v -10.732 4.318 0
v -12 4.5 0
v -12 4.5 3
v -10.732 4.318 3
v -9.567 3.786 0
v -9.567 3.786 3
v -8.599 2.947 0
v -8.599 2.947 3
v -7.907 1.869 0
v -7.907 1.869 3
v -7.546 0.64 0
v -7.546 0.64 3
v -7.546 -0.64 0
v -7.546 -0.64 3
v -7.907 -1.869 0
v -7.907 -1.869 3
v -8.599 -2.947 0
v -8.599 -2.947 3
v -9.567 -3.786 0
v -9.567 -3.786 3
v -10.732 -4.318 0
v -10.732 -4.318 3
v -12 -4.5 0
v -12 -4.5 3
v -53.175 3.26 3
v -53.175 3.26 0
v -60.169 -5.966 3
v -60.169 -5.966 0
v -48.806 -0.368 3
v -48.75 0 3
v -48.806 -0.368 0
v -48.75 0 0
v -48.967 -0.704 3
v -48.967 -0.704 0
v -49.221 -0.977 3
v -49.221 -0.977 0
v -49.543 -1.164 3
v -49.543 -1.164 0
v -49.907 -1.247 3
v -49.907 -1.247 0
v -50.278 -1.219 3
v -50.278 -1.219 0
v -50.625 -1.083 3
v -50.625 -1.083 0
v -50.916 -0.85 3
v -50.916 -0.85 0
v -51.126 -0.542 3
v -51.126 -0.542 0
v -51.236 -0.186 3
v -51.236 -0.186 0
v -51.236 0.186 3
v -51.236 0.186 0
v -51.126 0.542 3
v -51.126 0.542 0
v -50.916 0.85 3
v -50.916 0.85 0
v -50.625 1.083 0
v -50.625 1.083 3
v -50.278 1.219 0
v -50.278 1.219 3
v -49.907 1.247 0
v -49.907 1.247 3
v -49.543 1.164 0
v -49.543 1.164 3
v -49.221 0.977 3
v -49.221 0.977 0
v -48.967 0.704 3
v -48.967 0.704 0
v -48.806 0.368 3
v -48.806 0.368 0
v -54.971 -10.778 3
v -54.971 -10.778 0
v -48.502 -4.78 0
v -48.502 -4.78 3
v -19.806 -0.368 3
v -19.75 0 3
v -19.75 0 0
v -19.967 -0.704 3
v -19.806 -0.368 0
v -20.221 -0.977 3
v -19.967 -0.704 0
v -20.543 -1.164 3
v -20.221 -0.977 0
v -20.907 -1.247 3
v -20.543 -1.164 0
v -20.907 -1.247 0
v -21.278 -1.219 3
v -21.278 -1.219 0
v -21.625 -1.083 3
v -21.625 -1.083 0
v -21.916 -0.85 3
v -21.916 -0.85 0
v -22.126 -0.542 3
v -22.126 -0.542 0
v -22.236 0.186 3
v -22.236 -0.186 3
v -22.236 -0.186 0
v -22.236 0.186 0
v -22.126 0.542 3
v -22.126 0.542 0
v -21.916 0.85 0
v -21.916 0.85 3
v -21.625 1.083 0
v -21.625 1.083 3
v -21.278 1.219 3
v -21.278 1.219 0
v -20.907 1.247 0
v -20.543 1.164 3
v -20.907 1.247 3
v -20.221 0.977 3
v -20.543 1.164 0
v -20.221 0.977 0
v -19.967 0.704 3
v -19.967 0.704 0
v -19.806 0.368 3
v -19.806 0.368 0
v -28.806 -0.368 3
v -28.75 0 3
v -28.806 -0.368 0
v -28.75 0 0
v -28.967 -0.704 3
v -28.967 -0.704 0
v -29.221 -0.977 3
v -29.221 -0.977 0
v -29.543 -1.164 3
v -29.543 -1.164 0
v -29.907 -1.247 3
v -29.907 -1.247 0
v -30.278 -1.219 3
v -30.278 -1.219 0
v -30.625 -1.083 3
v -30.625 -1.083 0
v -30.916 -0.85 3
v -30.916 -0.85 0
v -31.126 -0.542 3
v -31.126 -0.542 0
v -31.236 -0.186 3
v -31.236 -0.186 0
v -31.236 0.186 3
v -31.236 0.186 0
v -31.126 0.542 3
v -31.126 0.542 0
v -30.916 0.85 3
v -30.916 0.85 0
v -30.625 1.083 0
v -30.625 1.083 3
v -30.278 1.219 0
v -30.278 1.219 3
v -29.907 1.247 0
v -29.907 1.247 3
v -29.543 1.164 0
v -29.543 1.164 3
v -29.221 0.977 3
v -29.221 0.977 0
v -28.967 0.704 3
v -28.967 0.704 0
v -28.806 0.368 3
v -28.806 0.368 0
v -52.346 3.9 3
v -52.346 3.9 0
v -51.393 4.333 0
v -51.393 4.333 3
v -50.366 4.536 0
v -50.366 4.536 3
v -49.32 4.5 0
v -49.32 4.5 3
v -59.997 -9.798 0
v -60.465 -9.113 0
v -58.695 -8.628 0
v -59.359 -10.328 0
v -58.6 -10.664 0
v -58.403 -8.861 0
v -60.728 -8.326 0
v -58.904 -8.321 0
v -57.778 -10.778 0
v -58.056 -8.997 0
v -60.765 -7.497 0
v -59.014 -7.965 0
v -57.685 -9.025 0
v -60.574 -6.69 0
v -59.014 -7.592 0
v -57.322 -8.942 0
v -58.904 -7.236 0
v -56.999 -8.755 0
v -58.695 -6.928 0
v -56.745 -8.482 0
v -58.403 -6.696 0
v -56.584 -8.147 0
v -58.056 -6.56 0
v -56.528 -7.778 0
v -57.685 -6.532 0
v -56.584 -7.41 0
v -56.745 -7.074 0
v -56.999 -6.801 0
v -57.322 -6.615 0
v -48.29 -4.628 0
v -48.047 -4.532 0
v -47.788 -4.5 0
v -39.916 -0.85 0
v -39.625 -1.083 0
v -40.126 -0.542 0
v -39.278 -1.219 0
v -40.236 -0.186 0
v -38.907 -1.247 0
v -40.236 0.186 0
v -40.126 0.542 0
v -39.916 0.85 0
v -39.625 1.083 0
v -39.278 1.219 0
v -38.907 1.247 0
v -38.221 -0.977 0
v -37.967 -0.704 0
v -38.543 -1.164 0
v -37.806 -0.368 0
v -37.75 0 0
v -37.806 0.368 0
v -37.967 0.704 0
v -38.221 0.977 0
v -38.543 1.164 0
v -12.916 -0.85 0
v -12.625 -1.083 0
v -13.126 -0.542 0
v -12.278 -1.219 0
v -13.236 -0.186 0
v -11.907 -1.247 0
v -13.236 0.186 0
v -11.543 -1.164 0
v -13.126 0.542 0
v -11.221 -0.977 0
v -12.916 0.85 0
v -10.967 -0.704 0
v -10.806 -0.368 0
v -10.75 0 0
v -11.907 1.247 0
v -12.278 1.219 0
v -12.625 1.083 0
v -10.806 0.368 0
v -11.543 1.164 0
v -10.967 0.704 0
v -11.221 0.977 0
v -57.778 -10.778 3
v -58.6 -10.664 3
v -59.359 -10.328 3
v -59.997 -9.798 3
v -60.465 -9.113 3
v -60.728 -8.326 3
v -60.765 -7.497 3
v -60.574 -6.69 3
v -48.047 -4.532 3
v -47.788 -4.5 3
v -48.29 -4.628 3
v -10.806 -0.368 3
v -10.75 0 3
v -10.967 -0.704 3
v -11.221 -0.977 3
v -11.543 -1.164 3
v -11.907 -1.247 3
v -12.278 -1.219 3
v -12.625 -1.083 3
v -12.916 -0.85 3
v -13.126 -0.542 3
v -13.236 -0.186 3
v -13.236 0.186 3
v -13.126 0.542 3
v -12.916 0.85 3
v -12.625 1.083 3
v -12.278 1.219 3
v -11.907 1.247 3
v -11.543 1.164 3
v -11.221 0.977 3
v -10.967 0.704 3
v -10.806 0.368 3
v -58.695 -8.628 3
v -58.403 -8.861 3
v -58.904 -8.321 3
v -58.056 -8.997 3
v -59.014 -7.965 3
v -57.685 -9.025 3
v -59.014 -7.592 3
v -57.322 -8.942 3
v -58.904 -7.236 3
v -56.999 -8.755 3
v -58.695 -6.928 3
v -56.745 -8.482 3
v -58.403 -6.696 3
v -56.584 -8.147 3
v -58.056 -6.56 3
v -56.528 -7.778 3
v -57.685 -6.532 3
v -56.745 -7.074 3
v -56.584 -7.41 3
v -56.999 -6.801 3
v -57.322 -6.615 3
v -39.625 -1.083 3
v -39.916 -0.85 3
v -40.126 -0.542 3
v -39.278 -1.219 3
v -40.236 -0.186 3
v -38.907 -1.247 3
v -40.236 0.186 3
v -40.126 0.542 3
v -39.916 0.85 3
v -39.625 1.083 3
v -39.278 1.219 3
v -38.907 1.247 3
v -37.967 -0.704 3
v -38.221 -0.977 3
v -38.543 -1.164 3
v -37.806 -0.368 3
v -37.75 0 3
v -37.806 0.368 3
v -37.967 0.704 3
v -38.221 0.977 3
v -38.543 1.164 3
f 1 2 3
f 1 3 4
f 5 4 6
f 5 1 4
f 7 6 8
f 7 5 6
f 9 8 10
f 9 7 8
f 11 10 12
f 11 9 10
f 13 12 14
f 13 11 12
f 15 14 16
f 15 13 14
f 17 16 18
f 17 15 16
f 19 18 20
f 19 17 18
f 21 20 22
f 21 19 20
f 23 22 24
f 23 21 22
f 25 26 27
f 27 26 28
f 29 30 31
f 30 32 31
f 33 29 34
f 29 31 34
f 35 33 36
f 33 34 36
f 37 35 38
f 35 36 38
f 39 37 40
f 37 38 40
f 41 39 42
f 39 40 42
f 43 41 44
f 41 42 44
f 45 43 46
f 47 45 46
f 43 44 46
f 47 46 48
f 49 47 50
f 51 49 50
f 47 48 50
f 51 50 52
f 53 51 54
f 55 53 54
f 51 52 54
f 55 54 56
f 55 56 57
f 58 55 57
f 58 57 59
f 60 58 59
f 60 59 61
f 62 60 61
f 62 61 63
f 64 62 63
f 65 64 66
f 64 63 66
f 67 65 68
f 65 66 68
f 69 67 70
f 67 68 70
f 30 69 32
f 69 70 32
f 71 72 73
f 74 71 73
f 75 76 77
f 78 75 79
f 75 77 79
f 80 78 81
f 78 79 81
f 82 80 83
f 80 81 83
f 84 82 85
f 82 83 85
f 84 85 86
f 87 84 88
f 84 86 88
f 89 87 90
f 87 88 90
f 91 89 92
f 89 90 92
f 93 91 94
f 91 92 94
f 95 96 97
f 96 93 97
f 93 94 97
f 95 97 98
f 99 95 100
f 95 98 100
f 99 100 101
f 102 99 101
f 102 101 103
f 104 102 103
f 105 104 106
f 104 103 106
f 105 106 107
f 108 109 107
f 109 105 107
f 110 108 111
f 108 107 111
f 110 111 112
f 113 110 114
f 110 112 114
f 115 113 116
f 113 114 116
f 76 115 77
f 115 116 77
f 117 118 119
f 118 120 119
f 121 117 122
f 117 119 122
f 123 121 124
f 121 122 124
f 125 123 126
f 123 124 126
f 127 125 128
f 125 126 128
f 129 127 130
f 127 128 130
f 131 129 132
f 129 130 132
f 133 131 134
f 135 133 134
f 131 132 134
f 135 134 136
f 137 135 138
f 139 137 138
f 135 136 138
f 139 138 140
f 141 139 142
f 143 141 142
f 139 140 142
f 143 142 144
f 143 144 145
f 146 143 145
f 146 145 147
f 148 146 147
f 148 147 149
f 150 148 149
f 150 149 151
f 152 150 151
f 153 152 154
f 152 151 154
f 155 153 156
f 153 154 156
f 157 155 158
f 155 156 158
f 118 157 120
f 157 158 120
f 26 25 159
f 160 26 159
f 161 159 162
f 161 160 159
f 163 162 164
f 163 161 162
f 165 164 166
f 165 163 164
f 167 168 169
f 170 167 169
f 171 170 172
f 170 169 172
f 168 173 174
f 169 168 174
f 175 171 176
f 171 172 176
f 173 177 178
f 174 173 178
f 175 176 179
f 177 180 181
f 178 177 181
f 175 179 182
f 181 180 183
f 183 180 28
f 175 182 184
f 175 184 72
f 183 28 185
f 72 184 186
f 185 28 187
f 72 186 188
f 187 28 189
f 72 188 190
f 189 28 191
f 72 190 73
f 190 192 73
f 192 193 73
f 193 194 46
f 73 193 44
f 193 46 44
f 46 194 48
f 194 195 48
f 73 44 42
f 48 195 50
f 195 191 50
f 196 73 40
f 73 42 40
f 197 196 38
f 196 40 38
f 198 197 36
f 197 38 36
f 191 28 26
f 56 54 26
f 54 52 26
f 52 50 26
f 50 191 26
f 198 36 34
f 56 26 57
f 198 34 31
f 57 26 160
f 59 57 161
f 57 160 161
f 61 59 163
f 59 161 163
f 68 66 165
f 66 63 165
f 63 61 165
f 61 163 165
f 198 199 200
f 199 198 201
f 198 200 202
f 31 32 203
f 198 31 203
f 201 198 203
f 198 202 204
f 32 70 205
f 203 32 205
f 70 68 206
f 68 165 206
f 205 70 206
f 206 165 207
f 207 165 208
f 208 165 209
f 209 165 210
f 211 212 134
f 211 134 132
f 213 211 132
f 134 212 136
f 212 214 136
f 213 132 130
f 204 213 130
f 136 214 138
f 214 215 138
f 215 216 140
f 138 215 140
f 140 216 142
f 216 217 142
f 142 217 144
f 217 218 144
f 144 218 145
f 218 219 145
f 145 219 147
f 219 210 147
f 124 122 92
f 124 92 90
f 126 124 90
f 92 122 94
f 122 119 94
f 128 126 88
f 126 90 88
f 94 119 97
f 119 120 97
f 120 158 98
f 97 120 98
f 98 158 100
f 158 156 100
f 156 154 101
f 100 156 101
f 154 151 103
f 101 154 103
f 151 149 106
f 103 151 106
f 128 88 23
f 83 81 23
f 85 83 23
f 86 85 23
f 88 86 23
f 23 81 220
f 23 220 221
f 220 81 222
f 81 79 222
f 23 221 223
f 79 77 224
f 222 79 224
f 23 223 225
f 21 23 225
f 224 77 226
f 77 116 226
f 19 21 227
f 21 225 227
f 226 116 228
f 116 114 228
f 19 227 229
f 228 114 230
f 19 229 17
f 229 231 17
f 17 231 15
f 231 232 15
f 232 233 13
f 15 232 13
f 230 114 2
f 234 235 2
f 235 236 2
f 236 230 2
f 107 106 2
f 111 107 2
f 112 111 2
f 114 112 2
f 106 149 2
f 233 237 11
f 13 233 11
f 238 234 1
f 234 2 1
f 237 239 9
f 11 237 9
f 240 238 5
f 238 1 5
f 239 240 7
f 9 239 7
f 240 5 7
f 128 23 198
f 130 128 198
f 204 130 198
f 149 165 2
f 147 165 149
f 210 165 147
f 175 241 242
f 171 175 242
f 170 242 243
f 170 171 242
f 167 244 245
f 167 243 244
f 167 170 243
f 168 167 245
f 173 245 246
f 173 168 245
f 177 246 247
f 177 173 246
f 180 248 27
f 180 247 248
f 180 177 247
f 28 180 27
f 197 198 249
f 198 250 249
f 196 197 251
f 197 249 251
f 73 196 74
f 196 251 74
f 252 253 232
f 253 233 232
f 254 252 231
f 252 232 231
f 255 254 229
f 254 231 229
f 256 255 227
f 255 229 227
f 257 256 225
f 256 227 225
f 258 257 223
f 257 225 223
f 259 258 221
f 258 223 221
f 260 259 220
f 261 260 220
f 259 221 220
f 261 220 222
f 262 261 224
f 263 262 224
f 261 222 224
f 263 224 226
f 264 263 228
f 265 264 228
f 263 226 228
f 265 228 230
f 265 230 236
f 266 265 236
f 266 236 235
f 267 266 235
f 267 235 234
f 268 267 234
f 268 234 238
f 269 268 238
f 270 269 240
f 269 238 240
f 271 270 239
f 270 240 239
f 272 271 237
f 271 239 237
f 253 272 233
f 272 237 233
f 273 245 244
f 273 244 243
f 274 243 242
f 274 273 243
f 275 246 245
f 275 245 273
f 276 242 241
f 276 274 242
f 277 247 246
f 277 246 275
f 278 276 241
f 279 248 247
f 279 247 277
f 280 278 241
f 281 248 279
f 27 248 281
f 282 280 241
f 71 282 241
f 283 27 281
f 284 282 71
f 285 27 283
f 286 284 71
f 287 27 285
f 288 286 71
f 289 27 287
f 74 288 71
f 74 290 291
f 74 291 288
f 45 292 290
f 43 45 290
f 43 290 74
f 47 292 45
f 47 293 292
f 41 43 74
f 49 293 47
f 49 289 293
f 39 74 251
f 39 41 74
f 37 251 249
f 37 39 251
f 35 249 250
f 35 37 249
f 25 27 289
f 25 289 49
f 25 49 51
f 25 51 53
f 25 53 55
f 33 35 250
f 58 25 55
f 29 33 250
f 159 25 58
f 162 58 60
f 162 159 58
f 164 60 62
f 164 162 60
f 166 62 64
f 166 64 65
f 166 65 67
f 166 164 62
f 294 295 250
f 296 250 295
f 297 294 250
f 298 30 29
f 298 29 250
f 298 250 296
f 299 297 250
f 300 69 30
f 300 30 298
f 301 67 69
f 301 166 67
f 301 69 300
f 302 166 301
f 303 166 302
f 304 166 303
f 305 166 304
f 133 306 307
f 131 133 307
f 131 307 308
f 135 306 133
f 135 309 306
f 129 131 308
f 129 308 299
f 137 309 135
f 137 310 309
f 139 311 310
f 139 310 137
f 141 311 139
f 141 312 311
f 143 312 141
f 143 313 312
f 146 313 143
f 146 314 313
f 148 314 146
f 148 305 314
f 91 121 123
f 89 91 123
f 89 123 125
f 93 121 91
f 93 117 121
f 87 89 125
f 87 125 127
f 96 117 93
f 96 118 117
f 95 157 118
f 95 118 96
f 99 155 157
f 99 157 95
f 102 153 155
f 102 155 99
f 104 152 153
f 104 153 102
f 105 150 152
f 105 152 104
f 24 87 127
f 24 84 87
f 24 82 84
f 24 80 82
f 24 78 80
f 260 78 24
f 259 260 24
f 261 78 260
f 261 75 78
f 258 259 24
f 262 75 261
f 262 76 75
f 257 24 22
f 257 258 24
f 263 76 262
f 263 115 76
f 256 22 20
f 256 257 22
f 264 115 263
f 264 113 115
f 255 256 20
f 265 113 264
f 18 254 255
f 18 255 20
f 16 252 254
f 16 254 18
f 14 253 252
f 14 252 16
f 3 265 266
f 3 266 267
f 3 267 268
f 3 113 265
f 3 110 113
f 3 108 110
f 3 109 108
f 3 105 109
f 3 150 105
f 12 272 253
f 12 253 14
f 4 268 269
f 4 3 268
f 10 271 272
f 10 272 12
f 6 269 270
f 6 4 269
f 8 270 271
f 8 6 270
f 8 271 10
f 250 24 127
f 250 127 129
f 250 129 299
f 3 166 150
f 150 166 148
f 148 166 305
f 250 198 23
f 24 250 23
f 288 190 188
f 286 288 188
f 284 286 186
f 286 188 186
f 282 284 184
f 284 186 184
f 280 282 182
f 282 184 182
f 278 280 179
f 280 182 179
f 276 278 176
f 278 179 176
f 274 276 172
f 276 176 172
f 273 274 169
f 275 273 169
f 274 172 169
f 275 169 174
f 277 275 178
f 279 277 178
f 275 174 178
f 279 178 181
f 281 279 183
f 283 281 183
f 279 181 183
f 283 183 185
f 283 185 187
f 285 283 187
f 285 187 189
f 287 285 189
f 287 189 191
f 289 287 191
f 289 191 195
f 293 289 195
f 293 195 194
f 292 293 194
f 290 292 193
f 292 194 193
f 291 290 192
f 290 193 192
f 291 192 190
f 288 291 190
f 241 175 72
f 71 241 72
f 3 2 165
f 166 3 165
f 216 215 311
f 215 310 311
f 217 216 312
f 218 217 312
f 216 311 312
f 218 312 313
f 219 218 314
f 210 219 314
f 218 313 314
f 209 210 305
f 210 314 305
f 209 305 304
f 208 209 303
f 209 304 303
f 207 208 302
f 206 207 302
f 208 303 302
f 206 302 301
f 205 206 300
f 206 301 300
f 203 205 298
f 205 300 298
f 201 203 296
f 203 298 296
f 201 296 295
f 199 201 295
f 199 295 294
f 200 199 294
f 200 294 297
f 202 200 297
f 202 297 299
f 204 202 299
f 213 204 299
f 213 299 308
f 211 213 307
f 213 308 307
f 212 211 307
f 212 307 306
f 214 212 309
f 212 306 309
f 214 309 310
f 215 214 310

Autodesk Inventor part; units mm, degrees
ref_plane "YZ Plane" through (0, 0, 0) normal (1, 0, 0) x (0, 1, 0)
ref_plane "XZ Plane" through (0, 0, 0) normal (0, 1, 0) x (-1, 0, 0)
ref_plane "XY Plane" through (0, 0, 0) normal (0, 0, 1) x (1, 0, 0)
sketch "スケッチ1" plane through (0, 0, 0) normal (0, 0, 1) x (1, 0, 0)
  circle A0 centre (-55, 0) radius 8.025 construction
  circle A1 centre (0, 0) radius 1.25 construction
  arc A2 (-44.5788, 6) -> (-63.6661, 8.3366) centre (-55, 0) ccw construction
  line L0 (-63.6661, 8.3366) -> (-109.1623, -38.9576) construction
  line L1 (-102.7709, -46.5745) -> (-48.2949, -9.9821) construction
  arc A3 (-48.2949, -9.9821) -> (-44.5788, -6) centre (-55, 0) ccw construction
  line L2 (-44.5788, -6) -> (-5.2915, -6) construction
  arc A4 (-5.2915, -6) -> (-5.2915, 6) centre (0, 0) ccw construction
  line L3 (-5.2915, 6) -> (-44.5788, 6) construction
  circle A5 centre (0, 0) radius 1.25
  circle A6 centre (-30, 0) radius 1.25
  circle A7 centre (-12, 0) radius 1.25
  circle A8 centre (-21, 0) radius 1.25
  line L4 (-30, 0) -> (0, 0)
  line L5 (-30, 0) -> (-50, 0)
  line L6 (-50, 0) -> (-30, 0)
  circle A9 centre (-50, 0) radius 1.25
  circle A10 centre (-50, 0) radius 4.025 construction
  circle A11 centre (-50, 0) radius 7.125 construction
  circle A12 centre (-57.7782, -7.7782) radius 1.25
  circle A13 centre (-57.7782, -7.7782) radius 3 construction
  line L7 (-50, 0) -> (-57.7782, -7.7782) construction
  line L8 (-53.1753, 3.2604) -> (-60.169, -5.9659)
  line L9 (-55.3874, -9.5904) -> (-46.209, 2.5181)
  arc A14 (-46.209, 2.5181) -> (-53.1753, 3.2604) centre (-50, 0) ccw
  arc A15 (-60.169, -5.9659) -> (-55.3874, -9.5904) centre (-57.7782, -7.7782) ccw
  line L10 (-50, 0) -> (0, 0) construction
  line L11 (-50, -4.5) -> (0, -4.5)
  line L12 (0, 4.5) -> (-50, 4.5)
  arc A16 (-50, 4.5) -> (-50, -4.5) centre (-50, 0) ccw
  arc A17 (0, -4.5) -> (0, 4.5) centre (0, 0) ccw
  line L13 (-57.7782, -10.7782) -> (-54.9706, -10.7782)
  line L14 (-54.9706, -10.7782) -> (-48.1997, -4.5)
  line L15 (-50, 0) -> (-57.7782, -7.7782)
  circle A18 centre (-12, 0) radius 4.5
  point P0 (-53.8891, -3.8891)
  point P1 (-25, 0)
  point P2 (-48.7574, -3)
  point P3 (-49.3198, 4.5)
  point P4 (-53.5862, 2.7184)
  point P5 (-51.3675, -4.2872)
  point P6 (-12, -4.5)
  point P7 (-12, 4.5)
  dimension "d0" = 20
  dimension "d2" = 2.5
  dimension "d3" = 8.05
  dimension "d4" = 3.1
  dimension "d5" = 30
  dimension "d6" = 2.5
  dimension "d7" = 2.5
  dimension "d8" = 2.5
  dimension "d9" = 2.5
  dimension "d11" = 9
  dimension "d13" = 2.5
  dimension "d14" = 6
  dimension "d15" = 6
  dimension "d16" = 9
  dimension "d21" = 135
  dimension "d22" = 10
  dimension "d30" = 9
  dimension "d31" = 11
extrude "押し出し1" add sketch "スケッチ1" along normal blind 3 contours L4 A8 A18 L11 A16 L9 L5 A6 | A6 L5 L9 A14 L12 A18 L4 A8 | L9 A16 L15 A9 L5 | L5 A9 L15 A16 L12 A14 L9 | A16 L11 L14 L13 A15 L9 | L9 A15 L8 A16 | A18 L4 A7 | L4 A7 A18 | L12 A16 L8 A14
fillet "フィレット1" radius 1.05 1 edges at (-48.1997, -4.5, 1.5)
sketch "スケッチ2" plane through (0, 0, 3) normal (0, 0, 1) x (1, 0, 0)
  arc A0 (-60.7927, -6.5251) -> (-59.7797, -5.8711) centre (-60.7525, -5.4759) ccw
  arc A1 (-55.3849, -4.4725) -> (-59.7797, -5.8711) centre (-57.0004, -7.0004) ccw
  arc A2 (-55.3849, -4.4725) -> (-43.7567, 3.1657) centre (-50, 0) ccw
  arc A3 (-44.0452, 4.6286) -> (-43.7567, 3.1657) centre (-43.1001, 4.055) ccw
  line L0 (-44.0452, 4.6286) -> (-41.5381, 8.9709)
  arc A4 (-41.5381, 8.9709) -> (-46.5567, 11.6351) centre (-44, 10.3923) ccw
  line L1 (-46.5567, 11.6351) -> (-49.0637, 7.2927)
  arc A5 (-50.5985, 6.9744) -> (-49.0637, 7.2927) centre (-49.9731, 7.8177) ccw
  arc A6 (-50.5985, 6.9744) -> (-50.2678, 6.9949) centre (-50, 0) ccw
  circle A7 centre (-50, 0) radius 4.025
  circle A8 centre (-50, 0) radius 1.25 projected
  circle A9 centre (-39, 0) radius 4
  line L2 (-50, 0) -> (-38.3804, 0)
  circle A10 centre (-39, 0) radius 1.25
  circle A11 centre (-30, 0) radius 1.25 projected
  point P0 (0, 0)
  point P1 (-43.3711, 2.3255)
  point P2 (-43, 0)
  point P3 (-49.3534, 6.9701)
  point P4 (-44.1966, 3.9141)
  point P5 (-43.7567, 3.1657)
  dimension "d23" = 12
  dimension "d24" = 8
  dimension "d27" = 2.5
  dimension "d28" = 9
  dimension "d29" = 7
extrude "押し出し2" cut sketch "スケッチ2" against normal blind 3 contours A10
thread "ねじ1" size "M3x0.5" class "6H" standard "ANSI Metric M Profile" full length
thread "ねじ2" size "M3x0.5" class "6H" standard "ANSI Metric M Profile" full length
thread "ねじ3" size "M3x0.5" class "6H" standard "ANSI Metric M Profile" full length
thread "ねじ4" size "M3x0.5" class "6H" standard "ANSI Metric M Profile" full length
thread "ねじ5" size "M3x0.5" class "6H" standard "ANSI Metric M Profile" full length
thread "ねじ6" size "M3x0.5" class "6H" standard "ANSI Metric M Profile" full length
properties part number "中間節アーム先端締結パーツ外" material "アルミニウム 7075"
